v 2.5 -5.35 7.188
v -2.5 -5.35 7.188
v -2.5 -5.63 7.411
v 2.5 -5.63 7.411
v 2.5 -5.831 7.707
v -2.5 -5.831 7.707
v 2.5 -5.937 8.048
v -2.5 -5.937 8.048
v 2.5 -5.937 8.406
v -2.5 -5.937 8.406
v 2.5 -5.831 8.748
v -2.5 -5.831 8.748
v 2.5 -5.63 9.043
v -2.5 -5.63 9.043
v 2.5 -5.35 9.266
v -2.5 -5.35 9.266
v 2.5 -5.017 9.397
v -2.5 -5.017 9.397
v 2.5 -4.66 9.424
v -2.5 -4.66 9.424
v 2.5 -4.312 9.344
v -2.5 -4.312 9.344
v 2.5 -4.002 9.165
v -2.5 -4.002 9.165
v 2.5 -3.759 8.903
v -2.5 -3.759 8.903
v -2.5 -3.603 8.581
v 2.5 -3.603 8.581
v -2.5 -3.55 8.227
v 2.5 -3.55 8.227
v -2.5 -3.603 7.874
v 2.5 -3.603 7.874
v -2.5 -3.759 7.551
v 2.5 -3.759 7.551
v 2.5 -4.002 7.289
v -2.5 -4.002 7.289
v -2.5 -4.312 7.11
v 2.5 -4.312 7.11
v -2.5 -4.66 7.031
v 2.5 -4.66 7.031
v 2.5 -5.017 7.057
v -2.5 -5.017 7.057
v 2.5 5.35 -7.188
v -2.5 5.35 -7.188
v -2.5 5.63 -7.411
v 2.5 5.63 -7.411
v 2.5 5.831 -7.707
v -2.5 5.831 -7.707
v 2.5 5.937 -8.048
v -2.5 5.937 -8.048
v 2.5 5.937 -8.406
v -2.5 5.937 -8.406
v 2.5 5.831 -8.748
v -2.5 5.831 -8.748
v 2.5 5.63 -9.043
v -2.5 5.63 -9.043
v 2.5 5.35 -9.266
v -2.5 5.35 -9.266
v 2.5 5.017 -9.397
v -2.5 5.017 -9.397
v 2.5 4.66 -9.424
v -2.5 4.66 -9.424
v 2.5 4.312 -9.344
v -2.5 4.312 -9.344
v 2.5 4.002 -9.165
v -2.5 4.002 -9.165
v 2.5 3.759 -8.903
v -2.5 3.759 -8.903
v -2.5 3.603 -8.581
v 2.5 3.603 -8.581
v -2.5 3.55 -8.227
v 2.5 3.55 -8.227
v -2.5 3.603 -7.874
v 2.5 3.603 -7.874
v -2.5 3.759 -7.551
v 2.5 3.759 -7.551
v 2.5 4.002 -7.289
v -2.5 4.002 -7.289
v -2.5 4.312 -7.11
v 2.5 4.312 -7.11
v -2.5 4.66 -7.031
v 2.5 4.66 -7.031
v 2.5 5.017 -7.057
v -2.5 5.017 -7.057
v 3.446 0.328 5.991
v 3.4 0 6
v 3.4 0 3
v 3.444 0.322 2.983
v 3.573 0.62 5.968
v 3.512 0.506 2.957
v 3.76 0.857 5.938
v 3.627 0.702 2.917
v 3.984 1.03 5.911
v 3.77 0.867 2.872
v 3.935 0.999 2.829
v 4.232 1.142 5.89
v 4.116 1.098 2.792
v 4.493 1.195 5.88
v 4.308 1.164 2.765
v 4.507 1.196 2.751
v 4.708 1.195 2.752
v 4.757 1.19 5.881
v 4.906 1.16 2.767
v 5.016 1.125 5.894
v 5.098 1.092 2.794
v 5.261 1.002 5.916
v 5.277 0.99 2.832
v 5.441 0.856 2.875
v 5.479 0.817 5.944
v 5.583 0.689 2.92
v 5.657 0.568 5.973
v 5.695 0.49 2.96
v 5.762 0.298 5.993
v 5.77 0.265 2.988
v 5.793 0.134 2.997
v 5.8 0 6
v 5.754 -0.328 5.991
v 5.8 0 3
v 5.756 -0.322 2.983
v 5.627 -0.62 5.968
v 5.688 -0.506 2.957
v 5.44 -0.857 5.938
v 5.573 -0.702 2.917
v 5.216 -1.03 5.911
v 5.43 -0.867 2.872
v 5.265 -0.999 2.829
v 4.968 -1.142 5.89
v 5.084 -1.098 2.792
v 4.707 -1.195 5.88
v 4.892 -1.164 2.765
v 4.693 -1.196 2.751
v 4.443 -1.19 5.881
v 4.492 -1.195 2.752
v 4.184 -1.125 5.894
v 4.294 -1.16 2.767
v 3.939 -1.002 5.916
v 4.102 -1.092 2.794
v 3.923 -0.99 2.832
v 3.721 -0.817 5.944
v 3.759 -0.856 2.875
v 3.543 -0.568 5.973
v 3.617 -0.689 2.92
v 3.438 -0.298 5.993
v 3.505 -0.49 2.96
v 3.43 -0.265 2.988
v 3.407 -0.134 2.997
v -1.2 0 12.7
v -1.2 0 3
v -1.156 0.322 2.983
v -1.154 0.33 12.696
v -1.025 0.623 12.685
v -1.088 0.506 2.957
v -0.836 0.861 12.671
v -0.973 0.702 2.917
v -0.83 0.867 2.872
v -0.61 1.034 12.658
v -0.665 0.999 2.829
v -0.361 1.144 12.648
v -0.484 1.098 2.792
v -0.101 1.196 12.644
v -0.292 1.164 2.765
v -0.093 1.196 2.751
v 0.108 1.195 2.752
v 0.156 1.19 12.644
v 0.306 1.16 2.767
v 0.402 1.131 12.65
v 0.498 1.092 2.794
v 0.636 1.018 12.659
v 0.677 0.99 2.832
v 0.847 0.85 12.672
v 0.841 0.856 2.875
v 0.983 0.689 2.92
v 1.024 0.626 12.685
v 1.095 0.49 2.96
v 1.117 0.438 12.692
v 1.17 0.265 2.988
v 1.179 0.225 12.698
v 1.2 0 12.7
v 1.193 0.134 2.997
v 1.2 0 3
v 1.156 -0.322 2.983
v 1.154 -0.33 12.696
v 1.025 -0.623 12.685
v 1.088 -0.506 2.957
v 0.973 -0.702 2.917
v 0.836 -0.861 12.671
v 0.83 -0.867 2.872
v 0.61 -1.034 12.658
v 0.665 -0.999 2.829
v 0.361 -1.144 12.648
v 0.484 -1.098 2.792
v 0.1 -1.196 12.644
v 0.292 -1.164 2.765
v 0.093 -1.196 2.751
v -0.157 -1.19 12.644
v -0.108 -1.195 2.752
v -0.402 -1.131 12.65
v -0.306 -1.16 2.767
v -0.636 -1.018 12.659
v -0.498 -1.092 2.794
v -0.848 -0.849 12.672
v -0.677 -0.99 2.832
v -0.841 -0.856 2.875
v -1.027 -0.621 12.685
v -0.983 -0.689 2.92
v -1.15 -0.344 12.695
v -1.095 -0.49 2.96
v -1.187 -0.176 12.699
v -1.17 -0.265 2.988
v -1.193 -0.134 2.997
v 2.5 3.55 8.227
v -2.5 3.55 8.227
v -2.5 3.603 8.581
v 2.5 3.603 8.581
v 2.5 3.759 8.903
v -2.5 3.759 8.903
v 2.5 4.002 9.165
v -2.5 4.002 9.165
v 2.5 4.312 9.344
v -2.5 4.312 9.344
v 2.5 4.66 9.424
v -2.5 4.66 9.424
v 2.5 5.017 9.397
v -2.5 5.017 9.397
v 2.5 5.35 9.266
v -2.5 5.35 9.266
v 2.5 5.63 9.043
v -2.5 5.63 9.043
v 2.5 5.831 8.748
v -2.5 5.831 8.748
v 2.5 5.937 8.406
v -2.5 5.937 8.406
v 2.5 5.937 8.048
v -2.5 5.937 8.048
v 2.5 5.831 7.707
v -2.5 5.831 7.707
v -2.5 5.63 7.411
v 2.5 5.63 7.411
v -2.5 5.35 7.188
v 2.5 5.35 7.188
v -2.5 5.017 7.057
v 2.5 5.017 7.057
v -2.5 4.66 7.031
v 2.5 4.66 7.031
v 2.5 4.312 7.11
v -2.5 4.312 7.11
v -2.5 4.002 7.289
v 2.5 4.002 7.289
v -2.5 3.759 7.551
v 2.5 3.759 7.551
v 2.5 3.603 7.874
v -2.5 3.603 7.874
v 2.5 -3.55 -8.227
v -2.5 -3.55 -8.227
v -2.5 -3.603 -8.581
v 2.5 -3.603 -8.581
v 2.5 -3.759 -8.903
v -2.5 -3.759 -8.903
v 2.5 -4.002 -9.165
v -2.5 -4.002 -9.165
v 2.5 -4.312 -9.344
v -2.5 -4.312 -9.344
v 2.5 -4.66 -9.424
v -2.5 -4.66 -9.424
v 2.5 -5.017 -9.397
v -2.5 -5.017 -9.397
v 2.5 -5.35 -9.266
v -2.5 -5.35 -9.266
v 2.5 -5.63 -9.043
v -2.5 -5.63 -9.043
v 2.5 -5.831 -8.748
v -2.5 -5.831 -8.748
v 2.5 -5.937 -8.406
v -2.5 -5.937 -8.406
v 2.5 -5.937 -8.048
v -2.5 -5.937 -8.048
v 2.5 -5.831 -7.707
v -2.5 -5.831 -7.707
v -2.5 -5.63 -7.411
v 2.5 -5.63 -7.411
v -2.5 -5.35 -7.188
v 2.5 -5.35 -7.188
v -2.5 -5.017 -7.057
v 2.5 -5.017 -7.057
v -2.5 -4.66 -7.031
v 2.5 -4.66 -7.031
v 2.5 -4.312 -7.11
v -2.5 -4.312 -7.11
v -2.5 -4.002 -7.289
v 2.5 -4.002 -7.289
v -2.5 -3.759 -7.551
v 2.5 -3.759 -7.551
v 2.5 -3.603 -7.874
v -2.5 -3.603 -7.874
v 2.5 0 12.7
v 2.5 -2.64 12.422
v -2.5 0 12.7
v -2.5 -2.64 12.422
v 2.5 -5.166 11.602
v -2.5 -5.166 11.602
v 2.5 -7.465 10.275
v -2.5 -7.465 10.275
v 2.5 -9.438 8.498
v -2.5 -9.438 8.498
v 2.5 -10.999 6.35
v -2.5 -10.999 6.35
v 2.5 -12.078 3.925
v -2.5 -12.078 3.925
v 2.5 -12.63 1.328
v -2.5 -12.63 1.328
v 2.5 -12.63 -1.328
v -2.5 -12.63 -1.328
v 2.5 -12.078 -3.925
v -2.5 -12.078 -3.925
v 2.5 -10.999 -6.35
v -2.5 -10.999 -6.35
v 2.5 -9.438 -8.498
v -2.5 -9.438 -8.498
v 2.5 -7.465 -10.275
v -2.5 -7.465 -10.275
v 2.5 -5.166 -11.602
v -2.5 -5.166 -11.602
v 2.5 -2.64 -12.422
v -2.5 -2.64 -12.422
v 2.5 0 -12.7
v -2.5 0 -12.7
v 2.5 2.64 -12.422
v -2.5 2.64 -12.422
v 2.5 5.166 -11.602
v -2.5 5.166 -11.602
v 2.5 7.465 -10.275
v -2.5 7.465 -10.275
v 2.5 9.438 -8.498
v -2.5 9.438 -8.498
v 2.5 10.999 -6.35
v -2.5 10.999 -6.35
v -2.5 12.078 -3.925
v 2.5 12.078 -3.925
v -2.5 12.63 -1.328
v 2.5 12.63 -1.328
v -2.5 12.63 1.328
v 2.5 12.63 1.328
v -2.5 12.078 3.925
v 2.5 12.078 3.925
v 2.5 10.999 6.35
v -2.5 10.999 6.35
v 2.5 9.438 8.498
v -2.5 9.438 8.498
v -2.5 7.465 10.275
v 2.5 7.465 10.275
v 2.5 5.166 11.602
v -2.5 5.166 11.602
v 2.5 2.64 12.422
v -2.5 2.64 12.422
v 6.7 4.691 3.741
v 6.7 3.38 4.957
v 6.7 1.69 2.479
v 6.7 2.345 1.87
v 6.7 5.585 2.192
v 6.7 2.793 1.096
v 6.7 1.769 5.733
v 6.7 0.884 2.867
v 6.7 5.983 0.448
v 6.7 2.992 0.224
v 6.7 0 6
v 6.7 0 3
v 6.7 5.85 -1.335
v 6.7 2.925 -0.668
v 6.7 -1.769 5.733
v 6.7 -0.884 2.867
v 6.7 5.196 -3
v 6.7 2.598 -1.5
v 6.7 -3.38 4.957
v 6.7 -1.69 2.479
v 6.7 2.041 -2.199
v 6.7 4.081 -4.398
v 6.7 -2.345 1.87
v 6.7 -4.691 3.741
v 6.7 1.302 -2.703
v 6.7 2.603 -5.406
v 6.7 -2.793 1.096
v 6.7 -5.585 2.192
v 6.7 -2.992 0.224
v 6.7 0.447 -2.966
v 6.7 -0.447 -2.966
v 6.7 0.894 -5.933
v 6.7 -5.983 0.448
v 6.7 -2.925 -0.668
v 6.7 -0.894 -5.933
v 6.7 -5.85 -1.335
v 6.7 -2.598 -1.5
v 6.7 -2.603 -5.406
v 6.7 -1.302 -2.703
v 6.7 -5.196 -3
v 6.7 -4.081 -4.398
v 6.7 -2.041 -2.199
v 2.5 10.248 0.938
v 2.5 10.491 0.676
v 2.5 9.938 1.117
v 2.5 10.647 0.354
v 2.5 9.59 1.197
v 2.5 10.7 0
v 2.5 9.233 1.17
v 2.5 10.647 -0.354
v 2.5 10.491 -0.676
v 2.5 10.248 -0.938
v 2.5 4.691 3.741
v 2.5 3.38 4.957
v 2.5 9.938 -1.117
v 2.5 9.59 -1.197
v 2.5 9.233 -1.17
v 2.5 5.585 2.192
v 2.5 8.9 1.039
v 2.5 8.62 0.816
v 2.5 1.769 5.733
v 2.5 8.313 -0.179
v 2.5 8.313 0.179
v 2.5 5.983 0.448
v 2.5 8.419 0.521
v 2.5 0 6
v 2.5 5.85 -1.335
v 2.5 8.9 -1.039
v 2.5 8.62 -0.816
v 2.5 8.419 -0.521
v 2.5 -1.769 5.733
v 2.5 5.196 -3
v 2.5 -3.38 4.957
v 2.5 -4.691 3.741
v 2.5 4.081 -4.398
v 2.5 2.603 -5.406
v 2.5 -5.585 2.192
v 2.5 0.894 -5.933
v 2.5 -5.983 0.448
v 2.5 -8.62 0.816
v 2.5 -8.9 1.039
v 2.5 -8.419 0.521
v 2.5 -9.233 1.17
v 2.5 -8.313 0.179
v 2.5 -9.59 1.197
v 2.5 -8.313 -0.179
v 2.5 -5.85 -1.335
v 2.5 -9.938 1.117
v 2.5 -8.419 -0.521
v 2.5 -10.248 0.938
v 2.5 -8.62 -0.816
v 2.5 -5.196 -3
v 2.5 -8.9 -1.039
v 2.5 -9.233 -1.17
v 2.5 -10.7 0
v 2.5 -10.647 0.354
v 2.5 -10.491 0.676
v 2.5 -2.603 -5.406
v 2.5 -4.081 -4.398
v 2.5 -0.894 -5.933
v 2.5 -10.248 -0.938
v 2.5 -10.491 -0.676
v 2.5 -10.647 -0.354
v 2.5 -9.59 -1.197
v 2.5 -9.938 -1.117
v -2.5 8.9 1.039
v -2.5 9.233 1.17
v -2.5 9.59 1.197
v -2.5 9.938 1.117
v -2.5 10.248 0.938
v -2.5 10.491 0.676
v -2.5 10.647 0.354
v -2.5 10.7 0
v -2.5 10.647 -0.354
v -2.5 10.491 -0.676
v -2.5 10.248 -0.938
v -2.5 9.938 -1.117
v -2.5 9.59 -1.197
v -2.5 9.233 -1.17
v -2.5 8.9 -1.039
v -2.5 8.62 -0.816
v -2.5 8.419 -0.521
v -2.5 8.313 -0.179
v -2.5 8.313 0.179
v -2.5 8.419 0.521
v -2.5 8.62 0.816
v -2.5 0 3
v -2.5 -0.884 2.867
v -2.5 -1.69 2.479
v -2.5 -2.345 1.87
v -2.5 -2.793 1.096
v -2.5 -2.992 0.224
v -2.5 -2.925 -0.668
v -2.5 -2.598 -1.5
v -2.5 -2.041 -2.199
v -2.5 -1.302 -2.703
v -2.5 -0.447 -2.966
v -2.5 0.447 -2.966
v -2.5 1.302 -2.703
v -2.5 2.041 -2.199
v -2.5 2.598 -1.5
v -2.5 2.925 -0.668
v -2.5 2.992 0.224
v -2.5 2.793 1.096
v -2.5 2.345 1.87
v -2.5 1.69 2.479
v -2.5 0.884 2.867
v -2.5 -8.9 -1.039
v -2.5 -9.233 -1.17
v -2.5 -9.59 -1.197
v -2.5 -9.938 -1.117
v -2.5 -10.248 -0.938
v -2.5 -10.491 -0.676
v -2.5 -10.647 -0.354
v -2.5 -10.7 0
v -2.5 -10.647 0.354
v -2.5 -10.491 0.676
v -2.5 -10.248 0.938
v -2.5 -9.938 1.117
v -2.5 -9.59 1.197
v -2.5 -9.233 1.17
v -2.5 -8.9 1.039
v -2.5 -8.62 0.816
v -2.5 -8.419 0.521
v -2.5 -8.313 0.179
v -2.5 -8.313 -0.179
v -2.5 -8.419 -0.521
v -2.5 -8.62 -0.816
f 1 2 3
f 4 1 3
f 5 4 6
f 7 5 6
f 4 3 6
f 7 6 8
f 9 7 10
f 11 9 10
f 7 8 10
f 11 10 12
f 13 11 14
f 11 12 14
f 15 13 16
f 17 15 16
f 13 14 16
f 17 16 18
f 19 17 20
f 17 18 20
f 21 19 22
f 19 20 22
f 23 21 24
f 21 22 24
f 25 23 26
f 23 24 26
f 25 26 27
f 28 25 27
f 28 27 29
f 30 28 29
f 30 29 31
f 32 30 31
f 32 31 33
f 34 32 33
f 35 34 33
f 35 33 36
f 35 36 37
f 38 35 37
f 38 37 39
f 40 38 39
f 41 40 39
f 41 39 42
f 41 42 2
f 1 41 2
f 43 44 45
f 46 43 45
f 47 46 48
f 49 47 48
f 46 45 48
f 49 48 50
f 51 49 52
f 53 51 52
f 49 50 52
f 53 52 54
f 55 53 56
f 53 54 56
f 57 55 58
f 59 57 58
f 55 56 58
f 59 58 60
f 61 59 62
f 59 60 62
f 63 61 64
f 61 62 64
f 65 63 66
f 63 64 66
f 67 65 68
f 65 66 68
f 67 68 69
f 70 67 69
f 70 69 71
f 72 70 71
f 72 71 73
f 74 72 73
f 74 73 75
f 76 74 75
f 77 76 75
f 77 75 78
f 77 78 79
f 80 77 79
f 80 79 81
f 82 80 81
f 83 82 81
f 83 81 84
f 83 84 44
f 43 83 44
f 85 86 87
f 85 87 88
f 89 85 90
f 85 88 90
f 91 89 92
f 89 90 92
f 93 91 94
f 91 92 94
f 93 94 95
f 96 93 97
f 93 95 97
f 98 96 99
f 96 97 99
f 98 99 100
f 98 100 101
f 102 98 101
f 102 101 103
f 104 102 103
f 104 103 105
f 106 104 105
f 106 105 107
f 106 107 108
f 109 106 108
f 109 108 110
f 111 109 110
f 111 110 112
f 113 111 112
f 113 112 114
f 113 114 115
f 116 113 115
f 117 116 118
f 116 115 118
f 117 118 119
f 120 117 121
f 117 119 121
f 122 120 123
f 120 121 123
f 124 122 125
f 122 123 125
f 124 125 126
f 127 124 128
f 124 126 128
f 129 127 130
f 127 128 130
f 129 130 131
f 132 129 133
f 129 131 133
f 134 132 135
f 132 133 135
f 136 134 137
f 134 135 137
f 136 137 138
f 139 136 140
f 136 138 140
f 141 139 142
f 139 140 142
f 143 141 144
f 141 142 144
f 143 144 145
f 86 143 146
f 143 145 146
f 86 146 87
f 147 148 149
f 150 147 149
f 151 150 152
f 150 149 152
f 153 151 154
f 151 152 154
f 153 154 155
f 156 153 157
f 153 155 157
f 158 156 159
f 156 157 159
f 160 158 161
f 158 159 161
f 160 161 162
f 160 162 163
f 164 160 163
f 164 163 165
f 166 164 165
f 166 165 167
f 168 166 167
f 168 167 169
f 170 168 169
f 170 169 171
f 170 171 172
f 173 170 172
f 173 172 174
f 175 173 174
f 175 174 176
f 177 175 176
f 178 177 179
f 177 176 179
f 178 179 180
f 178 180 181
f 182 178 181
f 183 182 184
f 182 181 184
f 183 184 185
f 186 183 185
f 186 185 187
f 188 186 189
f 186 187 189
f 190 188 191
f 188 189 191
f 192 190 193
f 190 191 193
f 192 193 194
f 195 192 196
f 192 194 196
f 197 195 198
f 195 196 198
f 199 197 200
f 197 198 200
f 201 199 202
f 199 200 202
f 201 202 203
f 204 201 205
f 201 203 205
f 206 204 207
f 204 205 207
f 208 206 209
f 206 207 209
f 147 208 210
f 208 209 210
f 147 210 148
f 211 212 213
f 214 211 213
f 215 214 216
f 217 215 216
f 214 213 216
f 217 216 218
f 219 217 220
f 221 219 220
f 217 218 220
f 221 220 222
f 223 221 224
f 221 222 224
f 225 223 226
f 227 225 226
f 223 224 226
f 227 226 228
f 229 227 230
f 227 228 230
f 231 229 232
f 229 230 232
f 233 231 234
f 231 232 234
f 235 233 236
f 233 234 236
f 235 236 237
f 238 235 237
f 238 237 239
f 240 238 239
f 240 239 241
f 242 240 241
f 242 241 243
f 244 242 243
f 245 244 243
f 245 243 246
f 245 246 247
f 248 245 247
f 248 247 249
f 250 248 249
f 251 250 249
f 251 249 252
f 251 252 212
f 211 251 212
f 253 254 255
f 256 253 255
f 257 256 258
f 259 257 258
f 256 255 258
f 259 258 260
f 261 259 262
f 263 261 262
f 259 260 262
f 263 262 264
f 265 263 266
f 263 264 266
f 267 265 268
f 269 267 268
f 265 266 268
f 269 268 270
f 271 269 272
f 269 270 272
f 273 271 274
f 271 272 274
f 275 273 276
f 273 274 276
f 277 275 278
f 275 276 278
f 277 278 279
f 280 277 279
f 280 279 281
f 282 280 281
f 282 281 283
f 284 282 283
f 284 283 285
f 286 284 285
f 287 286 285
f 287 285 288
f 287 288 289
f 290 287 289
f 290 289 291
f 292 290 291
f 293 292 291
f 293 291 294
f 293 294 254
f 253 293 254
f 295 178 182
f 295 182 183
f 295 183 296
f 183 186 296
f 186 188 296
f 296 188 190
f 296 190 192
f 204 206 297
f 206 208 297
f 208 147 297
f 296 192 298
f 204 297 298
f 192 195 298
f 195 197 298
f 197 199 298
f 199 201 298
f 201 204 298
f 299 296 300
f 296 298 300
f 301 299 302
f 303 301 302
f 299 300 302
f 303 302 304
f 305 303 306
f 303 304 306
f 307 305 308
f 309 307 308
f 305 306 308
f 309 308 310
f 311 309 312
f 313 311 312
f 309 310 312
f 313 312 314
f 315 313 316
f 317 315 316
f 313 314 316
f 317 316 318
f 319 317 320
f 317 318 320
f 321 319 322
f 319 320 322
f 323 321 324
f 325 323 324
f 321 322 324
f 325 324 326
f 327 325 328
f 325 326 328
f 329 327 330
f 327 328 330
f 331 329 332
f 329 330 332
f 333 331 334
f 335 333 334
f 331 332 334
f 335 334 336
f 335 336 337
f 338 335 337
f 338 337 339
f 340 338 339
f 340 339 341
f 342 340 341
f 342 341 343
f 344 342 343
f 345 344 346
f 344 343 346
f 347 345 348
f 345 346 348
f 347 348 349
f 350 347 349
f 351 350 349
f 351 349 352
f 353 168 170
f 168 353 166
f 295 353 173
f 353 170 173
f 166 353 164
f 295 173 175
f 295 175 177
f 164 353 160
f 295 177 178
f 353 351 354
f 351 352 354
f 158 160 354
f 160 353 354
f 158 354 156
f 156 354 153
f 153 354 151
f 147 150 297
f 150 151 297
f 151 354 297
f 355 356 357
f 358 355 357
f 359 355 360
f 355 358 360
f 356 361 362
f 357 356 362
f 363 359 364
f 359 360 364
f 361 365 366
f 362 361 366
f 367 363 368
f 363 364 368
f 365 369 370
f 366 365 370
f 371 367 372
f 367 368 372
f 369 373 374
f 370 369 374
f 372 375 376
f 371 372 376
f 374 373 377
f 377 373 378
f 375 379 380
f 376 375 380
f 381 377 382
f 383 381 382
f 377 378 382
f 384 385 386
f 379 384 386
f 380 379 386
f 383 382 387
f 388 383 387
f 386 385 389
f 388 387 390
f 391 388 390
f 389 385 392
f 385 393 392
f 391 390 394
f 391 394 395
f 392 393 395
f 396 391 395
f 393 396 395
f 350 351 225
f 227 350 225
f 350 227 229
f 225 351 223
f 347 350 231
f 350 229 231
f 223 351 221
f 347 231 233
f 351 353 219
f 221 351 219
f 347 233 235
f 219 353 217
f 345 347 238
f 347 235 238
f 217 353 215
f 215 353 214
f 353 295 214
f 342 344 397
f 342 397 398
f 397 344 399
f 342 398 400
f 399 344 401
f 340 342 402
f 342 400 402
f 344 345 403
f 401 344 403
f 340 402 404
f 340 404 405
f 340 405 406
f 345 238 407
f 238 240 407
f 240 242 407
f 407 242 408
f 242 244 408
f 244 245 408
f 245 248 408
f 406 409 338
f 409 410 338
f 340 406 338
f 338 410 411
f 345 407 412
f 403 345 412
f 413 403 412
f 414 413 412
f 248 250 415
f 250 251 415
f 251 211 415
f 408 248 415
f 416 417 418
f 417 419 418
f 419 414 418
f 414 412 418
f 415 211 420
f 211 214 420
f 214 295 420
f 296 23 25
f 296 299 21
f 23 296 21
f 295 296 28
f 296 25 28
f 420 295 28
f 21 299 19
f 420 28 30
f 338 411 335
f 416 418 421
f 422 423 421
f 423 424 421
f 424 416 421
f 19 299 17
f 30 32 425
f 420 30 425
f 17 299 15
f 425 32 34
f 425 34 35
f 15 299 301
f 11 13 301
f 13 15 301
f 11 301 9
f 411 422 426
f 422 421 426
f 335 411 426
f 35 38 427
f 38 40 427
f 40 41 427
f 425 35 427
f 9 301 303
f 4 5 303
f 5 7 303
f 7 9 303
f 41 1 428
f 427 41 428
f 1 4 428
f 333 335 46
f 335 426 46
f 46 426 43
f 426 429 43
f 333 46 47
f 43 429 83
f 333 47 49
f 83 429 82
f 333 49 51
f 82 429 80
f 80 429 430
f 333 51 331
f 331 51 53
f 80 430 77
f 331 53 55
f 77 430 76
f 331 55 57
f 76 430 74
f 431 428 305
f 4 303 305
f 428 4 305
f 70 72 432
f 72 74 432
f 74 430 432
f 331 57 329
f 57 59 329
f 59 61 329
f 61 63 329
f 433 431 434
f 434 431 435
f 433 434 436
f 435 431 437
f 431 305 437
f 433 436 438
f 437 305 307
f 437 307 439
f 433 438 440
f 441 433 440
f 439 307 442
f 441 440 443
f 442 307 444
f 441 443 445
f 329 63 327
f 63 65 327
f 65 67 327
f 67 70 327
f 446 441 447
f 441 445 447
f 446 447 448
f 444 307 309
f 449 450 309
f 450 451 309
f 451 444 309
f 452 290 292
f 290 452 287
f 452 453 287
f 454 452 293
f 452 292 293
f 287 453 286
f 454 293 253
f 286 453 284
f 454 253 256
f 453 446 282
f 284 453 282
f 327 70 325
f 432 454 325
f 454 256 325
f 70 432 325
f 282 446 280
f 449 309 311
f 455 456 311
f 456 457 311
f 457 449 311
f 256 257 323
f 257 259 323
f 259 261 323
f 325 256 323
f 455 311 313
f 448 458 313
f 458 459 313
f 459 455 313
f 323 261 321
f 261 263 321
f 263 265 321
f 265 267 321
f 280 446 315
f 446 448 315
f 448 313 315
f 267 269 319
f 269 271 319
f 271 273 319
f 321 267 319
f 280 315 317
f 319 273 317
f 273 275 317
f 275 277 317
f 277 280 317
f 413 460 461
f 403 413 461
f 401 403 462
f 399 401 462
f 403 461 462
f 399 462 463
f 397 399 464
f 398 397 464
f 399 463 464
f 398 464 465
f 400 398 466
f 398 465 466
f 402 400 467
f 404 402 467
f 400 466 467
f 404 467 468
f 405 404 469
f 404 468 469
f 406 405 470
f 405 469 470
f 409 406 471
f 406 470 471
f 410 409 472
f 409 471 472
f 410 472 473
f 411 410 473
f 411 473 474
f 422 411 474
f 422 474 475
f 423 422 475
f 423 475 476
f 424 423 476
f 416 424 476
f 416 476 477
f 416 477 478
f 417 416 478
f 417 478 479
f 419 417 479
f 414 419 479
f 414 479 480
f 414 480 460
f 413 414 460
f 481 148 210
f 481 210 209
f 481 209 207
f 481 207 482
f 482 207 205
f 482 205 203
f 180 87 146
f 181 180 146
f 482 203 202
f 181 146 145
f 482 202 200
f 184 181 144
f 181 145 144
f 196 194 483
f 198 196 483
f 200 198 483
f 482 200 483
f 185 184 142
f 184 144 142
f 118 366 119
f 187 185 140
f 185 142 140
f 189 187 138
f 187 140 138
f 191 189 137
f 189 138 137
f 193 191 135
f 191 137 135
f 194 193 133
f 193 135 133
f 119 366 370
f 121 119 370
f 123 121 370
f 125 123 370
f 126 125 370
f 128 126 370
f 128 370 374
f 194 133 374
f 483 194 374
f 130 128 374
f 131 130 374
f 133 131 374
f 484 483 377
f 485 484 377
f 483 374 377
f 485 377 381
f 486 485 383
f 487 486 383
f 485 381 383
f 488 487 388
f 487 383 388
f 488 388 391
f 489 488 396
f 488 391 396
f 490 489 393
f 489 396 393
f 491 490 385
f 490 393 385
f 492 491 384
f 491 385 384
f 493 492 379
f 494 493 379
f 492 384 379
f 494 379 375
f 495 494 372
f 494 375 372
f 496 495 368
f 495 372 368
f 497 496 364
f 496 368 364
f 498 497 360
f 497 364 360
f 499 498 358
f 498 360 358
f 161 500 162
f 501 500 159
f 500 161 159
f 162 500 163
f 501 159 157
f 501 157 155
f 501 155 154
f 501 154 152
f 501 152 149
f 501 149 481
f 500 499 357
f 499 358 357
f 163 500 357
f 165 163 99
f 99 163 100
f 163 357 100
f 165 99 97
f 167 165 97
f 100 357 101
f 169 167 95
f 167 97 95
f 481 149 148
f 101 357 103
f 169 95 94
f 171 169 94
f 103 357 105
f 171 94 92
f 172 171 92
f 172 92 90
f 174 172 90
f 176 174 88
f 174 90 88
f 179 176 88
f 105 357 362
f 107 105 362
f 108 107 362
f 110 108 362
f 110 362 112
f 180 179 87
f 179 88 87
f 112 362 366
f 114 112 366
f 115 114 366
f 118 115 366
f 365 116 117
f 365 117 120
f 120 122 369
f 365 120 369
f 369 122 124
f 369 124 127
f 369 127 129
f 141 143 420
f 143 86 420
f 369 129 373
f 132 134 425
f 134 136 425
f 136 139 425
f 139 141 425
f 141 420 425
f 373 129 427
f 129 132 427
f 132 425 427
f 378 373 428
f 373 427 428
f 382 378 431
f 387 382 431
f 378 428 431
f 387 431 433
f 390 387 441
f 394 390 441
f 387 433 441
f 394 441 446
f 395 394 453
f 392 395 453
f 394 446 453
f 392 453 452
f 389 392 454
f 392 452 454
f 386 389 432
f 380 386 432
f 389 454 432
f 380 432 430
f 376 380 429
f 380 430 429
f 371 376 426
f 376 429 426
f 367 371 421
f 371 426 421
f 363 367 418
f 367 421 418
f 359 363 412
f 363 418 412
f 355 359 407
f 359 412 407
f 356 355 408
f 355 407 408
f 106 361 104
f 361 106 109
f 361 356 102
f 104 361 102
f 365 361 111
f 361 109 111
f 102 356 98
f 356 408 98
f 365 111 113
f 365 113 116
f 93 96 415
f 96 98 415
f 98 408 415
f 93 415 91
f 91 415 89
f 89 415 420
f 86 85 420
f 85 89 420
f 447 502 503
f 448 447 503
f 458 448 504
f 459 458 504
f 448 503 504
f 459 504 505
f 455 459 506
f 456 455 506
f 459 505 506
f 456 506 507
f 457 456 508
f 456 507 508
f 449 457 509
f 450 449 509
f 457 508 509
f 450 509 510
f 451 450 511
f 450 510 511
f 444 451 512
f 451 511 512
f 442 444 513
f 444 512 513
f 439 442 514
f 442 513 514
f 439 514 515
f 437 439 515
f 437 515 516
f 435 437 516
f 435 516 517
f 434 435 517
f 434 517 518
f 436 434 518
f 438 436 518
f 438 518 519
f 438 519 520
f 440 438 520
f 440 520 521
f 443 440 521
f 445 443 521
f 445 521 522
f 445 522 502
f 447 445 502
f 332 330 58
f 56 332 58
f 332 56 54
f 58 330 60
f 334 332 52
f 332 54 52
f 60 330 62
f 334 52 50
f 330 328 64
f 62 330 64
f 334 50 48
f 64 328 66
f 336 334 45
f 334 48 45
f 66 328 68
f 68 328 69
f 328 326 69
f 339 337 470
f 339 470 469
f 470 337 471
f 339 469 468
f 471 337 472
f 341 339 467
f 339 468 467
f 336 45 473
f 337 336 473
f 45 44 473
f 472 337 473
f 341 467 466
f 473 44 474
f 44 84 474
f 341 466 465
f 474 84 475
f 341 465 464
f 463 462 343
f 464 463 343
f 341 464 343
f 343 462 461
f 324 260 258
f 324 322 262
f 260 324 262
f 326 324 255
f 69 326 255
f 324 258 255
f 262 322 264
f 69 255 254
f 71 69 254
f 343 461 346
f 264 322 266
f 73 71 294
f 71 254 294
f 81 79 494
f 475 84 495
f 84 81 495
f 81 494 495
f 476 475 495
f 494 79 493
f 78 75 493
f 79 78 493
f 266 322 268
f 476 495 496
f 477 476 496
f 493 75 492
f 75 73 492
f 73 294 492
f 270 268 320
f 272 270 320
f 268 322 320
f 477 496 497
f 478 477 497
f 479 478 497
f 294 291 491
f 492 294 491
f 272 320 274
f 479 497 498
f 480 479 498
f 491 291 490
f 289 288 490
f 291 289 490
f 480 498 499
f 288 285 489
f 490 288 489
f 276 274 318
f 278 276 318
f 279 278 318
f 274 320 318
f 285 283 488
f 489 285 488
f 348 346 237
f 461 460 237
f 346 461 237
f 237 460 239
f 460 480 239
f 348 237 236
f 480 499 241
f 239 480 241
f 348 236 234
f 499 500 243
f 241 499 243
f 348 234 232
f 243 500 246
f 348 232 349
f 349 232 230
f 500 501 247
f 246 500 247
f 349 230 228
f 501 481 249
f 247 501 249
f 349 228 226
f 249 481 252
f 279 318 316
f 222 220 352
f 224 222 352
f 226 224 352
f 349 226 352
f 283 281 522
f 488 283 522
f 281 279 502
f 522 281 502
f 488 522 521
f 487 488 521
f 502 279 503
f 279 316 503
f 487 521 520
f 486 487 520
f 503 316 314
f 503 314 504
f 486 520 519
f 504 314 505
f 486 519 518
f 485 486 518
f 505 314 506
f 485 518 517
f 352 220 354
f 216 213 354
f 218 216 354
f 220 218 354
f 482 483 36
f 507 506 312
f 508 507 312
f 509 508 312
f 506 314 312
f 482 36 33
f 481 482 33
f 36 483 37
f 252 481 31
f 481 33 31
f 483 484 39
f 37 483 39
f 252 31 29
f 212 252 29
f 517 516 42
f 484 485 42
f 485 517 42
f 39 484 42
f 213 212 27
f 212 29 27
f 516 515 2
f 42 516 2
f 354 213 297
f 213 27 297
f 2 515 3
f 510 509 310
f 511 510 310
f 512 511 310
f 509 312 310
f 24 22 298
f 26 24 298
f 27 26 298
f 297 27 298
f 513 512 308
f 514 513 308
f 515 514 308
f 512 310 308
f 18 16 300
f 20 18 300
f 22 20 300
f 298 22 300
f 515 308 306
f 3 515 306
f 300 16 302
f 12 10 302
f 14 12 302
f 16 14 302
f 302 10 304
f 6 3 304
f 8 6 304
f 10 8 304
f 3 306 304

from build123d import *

# Parameters (mm, degrees)
F3_D            = 2.4
F3_COPIES_COUNT = 6
F6_D            = 2.4
F6_DEPTH        = 12.7
F6_START        = 0.0568201
F6_TIP          = 0.7210327428
F9_D            = 2.4
F9_DEPTH        = 5
F9_START        = 0.1212247
F9_TIP          = 0.7210327428


# Not quite as in the source:
# - a pattern or mirror of a feature is missing from the dataset's text; its kind, count and spacing are read off the source's solid


with BuildPart() as f1:
    # F0 (on Front) → F1 (revolve)
    with BuildSketch(Plane.XZ):
        Polygon((-2.5, 12.7), (-2.5, 3), (6.7, 3), (6.7, 6), (2.5, 6), (2.5, 12.7), align=None)
    revolve(axis=Axis((2.1, 0, 0), (1, 0, 0)))

    # F3 (through all)
    with Locations(Plane.YZ.offset(2.5)):
        with Locations((4.75, 8.227241336)):
            f3 = Hole(F3_D / 2)

    # F3_copies: F3 ×6 about axis
    f3_copies_axis = Axis((0, 0, 0), (1, 0, 0))
    for i in range(1, F3_COPIES_COUNT):
        add(f3.rotate(f3_copies_axis, i * 360 / F3_COPIES_COUNT), mode=Mode.SUBTRACT)

    # F6
    # its depths count from where the whole tool has entered the part; down to there all is cleared
    with Locations(Plane.XY.offset(12.7).offset(-F6_START)):
        with Locations((0, 0)):
            Hole(F6_D / 2, depth=F6_DEPTH)
            with Locations((0, 0, -(F6_DEPTH + F6_TIP / 2))):  # 118° drill point
                Cone(0, F6_D / 2, F6_TIP, mode=Mode.SUBTRACT)

    # F9
    # its depths count from where the whole tool has entered the part; down to there all is cleared
    with Locations(Plane.XY.offset(6).offset(-F9_START)):
        with Locations((4.6, 0)):
            Hole(F9_D / 2, depth=F9_DEPTH)
            with Locations((0, 0, -(F9_DEPTH + F9_TIP / 2))):  # 118° drill point
                Cone(0, F9_D / 2, F9_TIP, mode=Mode.SUBTRACT)


solid = f1.part
